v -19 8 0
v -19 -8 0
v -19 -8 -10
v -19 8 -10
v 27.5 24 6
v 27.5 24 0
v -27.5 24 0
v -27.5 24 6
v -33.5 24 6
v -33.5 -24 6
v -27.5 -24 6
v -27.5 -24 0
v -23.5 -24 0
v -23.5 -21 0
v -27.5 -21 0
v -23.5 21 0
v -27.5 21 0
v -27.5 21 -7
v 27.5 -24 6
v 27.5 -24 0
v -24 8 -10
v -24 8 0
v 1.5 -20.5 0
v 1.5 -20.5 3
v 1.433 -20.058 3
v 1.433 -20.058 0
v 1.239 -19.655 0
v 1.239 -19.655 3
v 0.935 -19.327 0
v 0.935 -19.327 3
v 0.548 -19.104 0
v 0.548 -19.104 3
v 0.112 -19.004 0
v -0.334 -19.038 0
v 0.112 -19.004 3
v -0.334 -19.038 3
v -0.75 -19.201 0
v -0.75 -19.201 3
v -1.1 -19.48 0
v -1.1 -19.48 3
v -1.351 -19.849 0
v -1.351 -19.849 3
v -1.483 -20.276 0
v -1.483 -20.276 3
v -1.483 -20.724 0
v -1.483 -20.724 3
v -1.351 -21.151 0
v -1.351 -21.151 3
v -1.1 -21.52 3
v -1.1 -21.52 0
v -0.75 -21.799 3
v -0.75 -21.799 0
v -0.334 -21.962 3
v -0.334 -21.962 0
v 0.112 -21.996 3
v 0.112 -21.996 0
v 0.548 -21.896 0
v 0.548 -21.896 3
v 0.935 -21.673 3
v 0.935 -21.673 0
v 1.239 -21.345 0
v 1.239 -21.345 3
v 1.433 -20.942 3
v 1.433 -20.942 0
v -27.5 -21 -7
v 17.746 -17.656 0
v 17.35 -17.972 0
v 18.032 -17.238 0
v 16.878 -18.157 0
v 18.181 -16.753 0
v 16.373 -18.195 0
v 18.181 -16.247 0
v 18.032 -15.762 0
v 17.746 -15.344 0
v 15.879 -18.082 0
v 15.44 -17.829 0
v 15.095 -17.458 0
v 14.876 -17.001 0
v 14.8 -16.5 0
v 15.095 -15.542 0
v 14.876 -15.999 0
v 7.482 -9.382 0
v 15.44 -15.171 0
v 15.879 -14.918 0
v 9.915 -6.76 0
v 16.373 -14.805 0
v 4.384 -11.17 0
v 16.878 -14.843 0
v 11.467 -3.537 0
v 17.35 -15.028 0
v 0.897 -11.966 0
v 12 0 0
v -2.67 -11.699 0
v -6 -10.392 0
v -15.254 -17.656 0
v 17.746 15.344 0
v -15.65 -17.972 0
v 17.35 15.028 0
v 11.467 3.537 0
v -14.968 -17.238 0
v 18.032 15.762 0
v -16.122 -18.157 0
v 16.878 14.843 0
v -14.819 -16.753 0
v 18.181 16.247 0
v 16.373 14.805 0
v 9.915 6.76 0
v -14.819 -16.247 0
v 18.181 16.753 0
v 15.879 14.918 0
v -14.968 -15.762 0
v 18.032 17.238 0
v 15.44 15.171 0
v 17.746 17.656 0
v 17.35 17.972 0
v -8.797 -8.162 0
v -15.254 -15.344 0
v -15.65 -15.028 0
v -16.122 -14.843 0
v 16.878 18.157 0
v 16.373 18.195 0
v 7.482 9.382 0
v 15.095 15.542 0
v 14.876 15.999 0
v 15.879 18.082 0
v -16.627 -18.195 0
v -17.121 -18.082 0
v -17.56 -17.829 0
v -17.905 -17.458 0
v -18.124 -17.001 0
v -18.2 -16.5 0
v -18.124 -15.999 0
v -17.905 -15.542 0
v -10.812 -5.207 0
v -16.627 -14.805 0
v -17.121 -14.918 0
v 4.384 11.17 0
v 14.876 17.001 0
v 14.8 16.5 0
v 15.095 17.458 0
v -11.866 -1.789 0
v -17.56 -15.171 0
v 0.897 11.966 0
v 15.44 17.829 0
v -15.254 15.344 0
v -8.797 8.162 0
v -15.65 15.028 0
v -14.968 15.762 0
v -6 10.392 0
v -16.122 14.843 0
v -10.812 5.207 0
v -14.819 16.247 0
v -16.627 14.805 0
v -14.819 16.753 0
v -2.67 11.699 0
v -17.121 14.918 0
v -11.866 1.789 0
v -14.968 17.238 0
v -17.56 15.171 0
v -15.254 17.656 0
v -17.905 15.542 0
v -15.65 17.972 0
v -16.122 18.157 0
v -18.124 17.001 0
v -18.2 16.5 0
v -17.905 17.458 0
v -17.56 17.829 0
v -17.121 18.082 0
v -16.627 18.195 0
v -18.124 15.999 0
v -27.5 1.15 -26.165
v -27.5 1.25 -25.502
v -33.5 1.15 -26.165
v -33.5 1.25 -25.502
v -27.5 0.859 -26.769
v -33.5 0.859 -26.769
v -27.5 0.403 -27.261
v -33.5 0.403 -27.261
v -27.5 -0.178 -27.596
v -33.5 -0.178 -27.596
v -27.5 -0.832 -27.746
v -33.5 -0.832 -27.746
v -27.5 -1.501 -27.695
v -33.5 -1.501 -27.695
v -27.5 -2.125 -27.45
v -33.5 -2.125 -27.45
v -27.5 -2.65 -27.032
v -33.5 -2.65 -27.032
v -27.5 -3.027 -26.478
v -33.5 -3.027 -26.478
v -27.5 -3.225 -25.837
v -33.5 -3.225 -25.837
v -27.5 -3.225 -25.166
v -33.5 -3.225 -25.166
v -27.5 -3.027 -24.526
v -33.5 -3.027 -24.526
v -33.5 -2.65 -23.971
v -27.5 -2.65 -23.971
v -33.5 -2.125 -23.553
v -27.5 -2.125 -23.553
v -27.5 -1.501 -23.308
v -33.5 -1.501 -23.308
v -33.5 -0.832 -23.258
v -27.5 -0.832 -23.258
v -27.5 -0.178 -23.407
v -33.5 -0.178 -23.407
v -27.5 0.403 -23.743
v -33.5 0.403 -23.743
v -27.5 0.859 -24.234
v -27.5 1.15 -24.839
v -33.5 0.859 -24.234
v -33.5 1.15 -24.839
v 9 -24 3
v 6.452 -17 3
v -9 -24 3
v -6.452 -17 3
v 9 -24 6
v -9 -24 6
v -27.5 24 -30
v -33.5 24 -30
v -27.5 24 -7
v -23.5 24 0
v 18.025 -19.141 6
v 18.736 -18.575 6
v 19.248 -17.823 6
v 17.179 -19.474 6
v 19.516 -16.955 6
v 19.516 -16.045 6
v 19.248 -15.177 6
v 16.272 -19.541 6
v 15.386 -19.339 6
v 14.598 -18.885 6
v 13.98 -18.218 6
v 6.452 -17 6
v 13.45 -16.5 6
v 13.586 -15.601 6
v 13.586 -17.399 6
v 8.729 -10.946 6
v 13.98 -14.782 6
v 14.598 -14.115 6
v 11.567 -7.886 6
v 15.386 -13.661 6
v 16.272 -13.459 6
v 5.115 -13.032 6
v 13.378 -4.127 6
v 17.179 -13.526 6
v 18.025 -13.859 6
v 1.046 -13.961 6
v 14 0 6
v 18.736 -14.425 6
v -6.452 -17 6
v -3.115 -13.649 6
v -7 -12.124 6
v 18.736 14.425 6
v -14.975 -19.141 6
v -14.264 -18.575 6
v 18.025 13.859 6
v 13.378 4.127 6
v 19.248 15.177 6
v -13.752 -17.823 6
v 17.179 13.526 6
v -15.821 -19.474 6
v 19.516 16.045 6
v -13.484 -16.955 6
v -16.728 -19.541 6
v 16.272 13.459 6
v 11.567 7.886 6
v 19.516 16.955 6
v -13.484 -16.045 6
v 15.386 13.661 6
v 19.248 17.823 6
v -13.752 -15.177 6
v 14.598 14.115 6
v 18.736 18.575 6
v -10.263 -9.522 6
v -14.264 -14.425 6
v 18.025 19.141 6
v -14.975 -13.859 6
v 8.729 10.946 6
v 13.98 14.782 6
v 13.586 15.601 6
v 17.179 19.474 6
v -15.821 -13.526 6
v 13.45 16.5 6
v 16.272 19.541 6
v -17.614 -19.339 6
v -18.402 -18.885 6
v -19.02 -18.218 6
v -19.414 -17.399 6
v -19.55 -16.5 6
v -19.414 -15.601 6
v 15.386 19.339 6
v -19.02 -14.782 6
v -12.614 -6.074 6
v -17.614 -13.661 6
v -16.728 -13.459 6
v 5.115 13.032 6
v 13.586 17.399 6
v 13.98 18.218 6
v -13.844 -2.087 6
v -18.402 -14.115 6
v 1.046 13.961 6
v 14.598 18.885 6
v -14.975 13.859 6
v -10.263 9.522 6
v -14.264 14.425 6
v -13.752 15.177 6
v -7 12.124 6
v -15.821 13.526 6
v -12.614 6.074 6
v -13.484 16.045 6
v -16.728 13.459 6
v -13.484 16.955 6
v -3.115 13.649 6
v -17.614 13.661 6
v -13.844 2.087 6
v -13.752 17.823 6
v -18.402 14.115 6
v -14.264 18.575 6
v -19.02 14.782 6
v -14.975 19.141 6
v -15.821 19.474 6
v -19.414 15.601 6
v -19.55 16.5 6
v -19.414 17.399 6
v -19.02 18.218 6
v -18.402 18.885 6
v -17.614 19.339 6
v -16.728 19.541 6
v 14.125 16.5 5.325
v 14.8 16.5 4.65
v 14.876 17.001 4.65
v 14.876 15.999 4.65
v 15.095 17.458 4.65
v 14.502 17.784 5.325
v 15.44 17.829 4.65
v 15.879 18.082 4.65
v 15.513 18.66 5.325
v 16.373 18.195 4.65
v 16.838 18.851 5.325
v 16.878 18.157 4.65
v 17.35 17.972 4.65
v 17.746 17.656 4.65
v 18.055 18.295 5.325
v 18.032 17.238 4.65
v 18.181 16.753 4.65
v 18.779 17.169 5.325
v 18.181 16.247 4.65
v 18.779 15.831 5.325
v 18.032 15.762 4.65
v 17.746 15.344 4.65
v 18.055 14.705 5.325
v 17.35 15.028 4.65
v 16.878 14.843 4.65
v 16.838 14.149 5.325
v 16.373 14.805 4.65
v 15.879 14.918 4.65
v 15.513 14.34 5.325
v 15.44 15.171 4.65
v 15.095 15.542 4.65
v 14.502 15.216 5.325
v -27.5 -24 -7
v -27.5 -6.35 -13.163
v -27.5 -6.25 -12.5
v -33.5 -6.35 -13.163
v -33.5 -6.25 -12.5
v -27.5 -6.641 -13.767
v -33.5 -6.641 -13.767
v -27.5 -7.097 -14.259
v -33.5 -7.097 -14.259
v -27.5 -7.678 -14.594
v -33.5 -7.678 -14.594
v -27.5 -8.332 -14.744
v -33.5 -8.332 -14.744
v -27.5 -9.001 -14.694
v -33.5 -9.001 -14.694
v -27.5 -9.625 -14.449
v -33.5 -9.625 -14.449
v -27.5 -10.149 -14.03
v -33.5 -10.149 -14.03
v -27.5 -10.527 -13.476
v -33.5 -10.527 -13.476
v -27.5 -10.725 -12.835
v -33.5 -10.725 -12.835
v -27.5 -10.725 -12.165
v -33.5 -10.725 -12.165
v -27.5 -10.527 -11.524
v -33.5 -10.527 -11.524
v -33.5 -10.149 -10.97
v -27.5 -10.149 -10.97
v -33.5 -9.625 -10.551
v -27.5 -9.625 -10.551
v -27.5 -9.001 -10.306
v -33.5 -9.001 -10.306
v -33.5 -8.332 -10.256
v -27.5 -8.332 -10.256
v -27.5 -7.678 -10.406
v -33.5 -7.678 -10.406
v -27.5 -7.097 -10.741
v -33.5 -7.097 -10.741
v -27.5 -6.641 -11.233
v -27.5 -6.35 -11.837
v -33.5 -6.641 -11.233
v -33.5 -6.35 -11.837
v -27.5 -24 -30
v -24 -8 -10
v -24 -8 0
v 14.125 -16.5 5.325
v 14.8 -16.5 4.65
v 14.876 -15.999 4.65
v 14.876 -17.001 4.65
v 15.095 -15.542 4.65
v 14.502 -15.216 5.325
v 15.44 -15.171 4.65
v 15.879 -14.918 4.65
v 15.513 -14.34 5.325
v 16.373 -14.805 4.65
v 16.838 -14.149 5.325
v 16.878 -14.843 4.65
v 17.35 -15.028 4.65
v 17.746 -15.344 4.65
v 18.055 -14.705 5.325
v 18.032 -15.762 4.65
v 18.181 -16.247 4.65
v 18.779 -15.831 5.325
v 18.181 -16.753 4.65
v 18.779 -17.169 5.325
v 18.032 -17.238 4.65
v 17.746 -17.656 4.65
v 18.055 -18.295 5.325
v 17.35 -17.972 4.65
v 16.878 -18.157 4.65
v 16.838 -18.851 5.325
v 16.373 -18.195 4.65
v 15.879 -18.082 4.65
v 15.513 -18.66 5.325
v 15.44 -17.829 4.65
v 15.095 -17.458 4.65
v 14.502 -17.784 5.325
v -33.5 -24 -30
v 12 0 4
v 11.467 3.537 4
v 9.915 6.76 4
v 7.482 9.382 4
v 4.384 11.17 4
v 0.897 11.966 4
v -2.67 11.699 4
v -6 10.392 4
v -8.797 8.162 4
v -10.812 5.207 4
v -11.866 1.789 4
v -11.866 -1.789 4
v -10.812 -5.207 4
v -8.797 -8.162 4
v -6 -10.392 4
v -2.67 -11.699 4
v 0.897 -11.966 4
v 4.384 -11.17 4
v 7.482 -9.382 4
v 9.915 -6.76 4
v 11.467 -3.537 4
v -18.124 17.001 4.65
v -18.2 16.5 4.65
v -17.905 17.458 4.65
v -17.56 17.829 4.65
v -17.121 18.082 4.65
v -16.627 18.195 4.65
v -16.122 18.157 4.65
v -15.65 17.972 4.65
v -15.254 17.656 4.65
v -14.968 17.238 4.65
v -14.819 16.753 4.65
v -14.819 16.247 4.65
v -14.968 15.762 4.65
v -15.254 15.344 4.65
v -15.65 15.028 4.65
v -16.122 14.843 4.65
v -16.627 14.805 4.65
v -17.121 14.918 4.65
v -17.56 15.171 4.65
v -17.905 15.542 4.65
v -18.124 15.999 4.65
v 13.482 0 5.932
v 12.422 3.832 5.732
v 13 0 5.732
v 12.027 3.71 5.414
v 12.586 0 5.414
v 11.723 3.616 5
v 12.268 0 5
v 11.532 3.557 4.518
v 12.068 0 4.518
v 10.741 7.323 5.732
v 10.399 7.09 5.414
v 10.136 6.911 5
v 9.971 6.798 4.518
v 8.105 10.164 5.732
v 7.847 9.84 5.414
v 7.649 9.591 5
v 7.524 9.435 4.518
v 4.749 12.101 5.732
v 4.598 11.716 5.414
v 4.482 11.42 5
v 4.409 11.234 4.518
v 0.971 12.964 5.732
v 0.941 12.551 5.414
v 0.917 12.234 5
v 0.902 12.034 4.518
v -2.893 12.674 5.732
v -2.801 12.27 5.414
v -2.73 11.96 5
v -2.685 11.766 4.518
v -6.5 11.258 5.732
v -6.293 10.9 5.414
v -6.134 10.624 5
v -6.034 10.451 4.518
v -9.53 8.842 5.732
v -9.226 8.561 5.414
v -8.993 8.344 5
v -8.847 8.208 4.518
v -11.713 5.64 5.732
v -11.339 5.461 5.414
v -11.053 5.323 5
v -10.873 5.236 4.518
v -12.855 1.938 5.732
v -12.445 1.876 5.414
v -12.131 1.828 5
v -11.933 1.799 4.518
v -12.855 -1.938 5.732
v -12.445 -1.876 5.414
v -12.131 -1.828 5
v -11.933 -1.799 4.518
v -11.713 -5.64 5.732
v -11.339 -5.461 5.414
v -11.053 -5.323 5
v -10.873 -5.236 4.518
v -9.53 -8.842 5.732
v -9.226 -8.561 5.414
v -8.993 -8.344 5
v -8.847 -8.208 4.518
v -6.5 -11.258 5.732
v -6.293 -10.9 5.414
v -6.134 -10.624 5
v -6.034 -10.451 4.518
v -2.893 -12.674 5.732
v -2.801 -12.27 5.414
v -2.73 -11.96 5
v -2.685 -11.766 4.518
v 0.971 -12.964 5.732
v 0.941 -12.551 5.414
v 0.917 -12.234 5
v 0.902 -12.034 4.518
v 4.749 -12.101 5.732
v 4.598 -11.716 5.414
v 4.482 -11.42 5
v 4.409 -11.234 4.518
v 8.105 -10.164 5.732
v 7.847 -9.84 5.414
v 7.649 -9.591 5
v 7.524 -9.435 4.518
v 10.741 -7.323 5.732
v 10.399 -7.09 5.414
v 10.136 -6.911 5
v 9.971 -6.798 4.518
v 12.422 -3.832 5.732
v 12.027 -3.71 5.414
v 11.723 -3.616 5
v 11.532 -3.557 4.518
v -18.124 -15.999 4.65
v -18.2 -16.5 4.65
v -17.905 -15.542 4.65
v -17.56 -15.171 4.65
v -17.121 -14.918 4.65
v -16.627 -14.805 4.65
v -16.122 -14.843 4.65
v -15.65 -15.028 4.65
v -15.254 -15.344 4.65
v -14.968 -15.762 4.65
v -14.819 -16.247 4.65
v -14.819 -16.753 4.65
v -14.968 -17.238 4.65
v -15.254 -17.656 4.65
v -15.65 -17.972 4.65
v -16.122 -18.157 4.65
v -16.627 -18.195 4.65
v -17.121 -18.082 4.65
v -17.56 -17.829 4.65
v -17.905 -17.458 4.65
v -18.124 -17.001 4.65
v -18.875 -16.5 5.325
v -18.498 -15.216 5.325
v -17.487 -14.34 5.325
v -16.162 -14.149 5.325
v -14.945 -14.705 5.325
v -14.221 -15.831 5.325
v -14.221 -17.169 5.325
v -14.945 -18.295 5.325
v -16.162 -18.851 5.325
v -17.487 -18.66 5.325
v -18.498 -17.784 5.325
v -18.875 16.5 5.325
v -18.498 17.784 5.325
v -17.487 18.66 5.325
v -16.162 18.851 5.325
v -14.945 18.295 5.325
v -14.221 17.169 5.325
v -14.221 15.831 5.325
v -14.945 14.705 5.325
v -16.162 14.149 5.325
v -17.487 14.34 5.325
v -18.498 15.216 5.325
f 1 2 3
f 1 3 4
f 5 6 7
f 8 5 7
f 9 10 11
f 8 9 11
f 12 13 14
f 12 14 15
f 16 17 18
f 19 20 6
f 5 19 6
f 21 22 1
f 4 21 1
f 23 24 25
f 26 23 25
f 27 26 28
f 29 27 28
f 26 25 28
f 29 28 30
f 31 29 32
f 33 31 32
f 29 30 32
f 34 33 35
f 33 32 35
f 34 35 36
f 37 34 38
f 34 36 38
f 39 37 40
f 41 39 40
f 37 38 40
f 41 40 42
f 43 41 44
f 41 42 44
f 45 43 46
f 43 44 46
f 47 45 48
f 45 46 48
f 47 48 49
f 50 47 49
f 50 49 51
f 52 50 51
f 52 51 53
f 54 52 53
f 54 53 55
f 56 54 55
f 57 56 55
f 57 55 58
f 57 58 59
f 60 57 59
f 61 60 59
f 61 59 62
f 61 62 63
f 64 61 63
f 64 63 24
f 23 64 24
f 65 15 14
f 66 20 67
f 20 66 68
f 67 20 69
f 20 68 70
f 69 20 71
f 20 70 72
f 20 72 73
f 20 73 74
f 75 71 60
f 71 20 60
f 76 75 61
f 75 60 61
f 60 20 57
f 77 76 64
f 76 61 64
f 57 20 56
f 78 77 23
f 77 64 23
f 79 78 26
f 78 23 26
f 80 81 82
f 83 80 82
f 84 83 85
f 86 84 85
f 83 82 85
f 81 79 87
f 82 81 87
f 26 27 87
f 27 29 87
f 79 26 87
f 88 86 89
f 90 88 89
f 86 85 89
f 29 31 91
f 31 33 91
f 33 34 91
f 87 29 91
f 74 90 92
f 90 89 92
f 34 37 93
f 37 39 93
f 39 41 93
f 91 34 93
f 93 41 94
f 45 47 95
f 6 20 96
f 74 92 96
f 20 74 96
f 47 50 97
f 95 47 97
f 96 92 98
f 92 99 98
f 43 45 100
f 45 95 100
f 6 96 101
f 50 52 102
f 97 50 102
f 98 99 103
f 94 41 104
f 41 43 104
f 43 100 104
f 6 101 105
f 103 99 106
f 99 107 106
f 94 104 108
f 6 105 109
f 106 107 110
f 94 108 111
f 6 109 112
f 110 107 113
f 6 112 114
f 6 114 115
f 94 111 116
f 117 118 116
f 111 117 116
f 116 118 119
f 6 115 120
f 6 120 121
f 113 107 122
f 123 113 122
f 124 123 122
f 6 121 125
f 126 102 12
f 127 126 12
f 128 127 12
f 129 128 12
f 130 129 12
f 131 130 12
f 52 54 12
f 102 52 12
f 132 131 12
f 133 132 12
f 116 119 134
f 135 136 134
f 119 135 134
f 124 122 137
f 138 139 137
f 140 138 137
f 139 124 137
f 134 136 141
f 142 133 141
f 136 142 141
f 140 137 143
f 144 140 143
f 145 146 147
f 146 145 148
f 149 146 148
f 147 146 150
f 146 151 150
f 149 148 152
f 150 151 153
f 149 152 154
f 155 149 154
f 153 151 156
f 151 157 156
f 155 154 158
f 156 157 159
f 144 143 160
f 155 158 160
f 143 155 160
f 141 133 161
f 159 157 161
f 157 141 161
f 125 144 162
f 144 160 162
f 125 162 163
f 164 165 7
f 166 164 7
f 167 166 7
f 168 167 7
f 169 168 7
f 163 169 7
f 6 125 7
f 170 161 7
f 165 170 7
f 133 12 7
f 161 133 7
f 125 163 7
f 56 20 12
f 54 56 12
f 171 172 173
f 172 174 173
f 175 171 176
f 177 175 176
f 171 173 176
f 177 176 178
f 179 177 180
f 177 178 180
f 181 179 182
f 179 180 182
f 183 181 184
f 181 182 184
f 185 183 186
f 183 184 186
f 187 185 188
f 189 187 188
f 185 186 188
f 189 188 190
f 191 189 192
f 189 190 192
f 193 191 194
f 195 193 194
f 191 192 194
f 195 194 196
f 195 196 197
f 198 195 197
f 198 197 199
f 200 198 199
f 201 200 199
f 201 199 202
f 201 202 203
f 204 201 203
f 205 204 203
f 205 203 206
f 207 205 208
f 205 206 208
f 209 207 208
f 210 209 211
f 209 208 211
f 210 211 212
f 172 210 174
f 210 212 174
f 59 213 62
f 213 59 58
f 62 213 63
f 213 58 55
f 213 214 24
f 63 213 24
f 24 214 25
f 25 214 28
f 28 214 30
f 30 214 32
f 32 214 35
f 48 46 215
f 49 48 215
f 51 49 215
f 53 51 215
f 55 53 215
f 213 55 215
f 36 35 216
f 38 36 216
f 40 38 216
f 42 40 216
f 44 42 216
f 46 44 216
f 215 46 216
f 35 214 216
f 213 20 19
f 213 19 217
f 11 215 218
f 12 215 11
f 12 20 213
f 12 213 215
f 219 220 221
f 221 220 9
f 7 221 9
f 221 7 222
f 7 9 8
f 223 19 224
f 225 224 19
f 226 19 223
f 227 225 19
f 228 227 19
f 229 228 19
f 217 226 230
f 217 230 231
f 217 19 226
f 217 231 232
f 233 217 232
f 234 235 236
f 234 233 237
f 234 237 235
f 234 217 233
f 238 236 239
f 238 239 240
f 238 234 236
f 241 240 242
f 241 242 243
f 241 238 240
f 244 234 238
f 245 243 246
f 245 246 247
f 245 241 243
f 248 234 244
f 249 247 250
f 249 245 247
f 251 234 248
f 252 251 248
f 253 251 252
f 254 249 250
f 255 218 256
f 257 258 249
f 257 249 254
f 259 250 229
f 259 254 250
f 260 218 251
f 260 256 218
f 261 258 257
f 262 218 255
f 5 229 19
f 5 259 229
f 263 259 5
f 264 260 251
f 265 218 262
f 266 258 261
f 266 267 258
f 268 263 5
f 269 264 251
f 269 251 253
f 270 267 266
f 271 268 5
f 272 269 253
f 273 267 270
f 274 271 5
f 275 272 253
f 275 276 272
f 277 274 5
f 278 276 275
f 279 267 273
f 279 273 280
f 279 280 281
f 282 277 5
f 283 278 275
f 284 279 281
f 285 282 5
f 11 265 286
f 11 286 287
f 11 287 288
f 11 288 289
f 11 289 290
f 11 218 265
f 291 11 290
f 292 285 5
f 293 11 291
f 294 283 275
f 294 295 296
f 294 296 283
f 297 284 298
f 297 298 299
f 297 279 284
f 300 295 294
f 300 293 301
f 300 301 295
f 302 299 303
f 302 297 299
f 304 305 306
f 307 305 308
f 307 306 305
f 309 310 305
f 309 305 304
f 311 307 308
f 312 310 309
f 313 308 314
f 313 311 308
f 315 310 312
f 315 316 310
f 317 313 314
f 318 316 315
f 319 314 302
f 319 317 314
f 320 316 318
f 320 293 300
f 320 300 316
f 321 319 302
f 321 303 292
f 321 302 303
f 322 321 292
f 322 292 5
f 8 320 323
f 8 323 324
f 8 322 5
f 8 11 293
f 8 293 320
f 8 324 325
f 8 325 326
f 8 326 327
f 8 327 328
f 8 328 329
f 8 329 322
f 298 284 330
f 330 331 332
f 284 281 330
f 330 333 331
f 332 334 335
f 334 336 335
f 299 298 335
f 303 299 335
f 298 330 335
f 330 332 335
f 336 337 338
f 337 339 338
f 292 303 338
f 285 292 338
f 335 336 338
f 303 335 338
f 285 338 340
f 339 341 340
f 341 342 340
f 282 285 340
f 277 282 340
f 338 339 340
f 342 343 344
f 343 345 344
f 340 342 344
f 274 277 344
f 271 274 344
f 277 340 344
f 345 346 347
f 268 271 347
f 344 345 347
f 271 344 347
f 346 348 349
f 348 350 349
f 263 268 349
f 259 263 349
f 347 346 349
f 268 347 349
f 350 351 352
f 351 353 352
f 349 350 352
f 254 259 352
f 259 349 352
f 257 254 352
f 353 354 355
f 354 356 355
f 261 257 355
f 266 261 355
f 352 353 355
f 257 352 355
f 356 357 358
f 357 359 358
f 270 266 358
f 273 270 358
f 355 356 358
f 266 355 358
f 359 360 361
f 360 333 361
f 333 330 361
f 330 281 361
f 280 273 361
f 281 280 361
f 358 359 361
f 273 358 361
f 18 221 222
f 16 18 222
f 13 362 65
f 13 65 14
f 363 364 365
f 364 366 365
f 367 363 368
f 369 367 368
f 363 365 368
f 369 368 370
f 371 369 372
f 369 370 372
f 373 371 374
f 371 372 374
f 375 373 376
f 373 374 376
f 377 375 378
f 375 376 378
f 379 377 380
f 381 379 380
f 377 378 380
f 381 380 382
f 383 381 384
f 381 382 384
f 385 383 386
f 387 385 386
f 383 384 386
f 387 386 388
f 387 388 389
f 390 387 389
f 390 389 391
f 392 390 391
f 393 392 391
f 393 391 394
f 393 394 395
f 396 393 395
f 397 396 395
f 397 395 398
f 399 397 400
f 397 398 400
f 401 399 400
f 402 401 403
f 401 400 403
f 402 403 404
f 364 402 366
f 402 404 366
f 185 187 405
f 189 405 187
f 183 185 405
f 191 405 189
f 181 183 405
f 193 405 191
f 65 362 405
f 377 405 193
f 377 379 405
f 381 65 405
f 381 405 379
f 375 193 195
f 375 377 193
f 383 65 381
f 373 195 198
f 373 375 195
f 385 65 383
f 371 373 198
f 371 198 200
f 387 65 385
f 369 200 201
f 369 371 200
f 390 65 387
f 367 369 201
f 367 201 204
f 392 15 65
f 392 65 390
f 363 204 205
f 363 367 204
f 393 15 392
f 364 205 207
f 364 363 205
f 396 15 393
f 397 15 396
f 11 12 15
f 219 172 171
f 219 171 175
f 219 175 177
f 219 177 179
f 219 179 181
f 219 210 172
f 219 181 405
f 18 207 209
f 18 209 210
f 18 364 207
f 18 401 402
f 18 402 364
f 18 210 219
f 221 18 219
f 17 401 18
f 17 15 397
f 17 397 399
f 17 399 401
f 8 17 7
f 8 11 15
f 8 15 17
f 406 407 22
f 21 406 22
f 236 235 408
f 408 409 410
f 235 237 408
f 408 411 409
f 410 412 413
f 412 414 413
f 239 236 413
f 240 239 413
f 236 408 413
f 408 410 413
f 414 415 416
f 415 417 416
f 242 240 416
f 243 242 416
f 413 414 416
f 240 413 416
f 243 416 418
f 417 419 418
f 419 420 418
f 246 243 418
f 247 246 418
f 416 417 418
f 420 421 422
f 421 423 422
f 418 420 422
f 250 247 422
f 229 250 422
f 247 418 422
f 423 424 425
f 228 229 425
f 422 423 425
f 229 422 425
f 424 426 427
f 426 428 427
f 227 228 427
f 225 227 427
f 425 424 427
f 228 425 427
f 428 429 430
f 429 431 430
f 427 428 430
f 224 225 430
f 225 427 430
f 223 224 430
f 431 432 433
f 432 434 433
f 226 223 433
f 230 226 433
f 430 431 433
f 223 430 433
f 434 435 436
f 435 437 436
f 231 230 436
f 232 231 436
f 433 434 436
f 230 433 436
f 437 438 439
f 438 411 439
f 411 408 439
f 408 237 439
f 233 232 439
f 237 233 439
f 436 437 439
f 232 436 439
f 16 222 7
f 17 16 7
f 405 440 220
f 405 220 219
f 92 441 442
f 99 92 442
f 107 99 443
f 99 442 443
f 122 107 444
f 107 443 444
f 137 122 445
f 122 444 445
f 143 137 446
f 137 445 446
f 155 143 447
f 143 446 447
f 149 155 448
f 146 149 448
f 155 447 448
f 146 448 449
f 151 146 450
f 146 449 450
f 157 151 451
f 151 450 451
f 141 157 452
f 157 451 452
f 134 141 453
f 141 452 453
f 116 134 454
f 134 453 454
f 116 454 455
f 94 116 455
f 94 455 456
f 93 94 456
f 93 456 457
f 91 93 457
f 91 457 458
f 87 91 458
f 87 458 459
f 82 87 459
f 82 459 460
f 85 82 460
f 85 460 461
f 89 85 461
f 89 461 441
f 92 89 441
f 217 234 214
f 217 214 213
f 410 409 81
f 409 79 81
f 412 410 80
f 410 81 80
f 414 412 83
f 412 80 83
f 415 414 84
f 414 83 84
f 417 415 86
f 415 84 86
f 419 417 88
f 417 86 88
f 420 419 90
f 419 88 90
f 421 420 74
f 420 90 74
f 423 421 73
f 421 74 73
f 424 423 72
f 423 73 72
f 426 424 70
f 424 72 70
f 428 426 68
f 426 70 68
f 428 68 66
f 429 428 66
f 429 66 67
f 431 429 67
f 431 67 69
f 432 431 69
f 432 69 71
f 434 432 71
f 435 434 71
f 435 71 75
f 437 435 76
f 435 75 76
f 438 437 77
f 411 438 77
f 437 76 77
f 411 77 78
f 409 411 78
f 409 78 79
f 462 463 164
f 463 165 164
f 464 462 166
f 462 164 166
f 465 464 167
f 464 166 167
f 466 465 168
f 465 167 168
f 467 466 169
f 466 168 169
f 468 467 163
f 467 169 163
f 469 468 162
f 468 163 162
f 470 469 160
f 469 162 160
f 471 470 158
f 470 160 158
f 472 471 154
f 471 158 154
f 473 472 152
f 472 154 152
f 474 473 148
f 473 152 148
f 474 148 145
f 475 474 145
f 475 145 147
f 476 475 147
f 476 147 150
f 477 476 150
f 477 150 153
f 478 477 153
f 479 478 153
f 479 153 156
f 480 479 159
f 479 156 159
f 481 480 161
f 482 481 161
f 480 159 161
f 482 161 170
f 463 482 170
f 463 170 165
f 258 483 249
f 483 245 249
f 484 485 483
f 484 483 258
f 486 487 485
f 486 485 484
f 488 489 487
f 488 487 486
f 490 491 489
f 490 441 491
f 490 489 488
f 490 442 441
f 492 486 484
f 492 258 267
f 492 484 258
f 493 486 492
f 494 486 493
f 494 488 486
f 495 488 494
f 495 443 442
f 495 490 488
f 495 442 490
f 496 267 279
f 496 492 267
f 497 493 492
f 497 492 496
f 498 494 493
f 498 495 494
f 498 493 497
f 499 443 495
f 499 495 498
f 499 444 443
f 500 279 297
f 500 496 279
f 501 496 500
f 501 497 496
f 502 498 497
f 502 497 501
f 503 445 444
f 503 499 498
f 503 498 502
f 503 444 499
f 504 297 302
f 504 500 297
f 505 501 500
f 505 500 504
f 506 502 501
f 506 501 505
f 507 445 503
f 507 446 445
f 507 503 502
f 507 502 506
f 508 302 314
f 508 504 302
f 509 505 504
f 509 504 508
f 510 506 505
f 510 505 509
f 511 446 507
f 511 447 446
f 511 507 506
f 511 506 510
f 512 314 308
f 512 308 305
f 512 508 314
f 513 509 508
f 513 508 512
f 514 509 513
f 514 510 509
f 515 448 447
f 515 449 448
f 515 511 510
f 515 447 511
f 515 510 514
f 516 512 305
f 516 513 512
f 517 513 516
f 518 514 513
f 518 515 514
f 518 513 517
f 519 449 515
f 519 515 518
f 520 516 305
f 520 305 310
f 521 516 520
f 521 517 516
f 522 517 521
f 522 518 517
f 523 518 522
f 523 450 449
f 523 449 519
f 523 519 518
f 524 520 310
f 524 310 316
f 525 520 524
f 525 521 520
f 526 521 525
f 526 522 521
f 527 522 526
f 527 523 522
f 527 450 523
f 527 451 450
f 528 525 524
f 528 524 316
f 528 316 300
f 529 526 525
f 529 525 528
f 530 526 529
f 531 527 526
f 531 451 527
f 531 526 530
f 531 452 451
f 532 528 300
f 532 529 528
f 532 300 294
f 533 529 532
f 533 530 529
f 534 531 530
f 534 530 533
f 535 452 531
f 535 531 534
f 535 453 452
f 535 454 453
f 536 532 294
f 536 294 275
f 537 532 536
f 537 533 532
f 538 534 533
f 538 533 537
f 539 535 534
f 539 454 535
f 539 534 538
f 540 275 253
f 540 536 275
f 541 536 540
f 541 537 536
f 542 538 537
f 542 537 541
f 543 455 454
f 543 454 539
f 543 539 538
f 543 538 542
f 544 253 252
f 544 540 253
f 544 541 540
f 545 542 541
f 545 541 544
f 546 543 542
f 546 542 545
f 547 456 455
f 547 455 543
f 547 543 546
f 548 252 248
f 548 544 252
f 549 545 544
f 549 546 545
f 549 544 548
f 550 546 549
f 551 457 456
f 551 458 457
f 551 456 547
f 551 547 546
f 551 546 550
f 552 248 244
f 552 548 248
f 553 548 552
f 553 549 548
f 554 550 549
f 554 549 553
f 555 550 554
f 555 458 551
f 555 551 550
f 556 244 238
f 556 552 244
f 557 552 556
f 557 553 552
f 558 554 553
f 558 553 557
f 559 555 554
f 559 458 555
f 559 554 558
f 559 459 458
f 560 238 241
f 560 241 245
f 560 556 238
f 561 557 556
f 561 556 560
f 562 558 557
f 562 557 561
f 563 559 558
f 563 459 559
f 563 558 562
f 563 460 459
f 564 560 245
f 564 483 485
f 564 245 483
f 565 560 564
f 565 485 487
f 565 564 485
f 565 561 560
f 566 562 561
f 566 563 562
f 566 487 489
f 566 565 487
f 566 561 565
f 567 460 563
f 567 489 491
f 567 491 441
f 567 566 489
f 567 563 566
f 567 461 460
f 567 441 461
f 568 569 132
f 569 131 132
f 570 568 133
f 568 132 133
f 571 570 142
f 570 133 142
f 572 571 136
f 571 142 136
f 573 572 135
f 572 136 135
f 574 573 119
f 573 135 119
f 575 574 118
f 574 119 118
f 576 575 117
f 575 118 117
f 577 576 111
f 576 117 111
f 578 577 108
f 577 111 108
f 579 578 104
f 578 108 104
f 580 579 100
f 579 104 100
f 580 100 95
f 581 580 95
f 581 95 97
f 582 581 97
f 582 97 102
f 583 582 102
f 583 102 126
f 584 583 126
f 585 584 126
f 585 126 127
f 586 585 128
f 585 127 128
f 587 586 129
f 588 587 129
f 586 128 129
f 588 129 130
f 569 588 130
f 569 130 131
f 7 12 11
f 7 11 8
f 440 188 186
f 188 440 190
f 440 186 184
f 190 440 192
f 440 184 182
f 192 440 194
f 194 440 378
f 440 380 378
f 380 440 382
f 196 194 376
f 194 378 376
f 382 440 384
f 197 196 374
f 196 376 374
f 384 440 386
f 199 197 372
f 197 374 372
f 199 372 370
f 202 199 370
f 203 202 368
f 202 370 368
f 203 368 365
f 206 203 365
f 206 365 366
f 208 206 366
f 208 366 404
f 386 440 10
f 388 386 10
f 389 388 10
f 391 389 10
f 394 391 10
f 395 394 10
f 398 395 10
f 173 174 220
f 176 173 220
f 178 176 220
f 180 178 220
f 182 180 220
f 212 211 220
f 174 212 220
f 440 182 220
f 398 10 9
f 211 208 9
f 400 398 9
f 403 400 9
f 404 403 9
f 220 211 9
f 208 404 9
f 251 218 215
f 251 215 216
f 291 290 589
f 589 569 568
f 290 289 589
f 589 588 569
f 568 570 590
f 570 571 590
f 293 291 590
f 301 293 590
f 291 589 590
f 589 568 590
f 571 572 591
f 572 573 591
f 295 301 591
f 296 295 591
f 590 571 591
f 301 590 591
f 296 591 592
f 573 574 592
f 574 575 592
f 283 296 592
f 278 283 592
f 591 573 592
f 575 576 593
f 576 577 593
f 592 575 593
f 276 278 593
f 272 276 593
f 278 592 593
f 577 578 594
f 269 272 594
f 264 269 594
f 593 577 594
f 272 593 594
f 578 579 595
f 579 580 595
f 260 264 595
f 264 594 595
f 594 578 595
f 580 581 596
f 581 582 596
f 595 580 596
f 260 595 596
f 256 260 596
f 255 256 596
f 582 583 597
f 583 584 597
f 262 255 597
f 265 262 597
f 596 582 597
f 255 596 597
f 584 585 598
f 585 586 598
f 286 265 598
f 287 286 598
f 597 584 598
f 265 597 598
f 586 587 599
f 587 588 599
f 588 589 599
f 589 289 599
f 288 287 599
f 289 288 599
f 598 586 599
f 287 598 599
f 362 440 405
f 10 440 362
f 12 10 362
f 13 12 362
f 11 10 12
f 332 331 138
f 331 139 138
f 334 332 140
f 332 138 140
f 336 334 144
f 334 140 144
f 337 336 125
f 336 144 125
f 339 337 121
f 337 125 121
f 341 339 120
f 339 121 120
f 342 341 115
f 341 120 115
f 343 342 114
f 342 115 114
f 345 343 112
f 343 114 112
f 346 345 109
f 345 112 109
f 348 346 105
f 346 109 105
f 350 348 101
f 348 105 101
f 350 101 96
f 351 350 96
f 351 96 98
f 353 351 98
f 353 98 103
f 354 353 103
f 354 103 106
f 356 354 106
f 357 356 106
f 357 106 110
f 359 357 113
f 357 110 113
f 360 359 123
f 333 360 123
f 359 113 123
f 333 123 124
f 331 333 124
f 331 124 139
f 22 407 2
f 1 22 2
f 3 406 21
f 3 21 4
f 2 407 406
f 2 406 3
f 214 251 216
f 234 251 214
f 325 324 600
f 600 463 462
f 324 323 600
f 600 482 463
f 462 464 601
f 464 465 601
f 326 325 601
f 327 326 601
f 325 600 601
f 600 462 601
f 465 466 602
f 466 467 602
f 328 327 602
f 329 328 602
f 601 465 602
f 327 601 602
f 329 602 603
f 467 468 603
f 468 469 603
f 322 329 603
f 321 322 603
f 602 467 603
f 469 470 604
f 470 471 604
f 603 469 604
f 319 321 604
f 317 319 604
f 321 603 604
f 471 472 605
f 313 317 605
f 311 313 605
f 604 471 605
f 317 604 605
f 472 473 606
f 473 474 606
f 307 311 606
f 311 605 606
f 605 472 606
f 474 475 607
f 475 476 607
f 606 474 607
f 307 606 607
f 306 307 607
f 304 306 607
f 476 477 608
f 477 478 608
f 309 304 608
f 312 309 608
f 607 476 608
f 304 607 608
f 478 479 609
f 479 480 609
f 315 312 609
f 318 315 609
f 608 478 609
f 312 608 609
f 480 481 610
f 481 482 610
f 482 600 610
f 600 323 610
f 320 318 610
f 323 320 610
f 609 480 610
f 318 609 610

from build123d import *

# Parameters (mm, degrees)
BINDER_W            = 48
BINDER_H            = 55
PAD_DEPTH           = 6
HOLE_D              = 3.4
HOLE_CSINK_D        = 6.1
HOLE_CSINK_ANGLE    = 90
SKETCH005_R         = 12
POCKET_DEPTH        = 6.001
FILLET_R            = 2
POCKET001_DEPTH     = 3
SKETCH007_R         = 1.5
POCKET002_DEPTH     = 3.001
SKETCH002_W         = 6
SKETCH002_H         = 48
PAD001_DEPTH        = 6
PAD001_DEPTH_BACK   = 30
PAD002_DEPTH        = 3
HOLE004_D           = 4.5
HOLE004_DEPTH       = 25
HOLE004_CSINK_D     = 6.1
HOLE004_CSINK_ANGLE = 90
SKETCH019_W         = 5
SKETCH019_H         = 16
PAD003_DEPTH        = 10


with BuildPart() as body001:
    # Binder → Pad (new body)
    with BuildSketch(Plane(origin=(0, 0, 0), x_dir=(0, 1, 0), z_dir=(0, 0, 1))):
        Rectangle(BINDER_W, BINDER_H)
    extrude(amount=PAD_DEPTH)

    # Hole (through all)
    with Locations(Plane.XY.offset(6)):
        with Locations((-16.5, 16.5), (-16.5, -16.5), (16.5, -16.5), (16.5, 16.5)):
            CounterSinkHole(HOLE_D / 2, HOLE_CSINK_D / 2, counter_sink_angle=HOLE_CSINK_ANGLE)

    # Sketch005 (on Face5 of Hole) → Pocket (cut, through all)
    with BuildSketch(Plane.XY.offset(6)):
        Circle(SKETCH005_R)
    extrude(amount=-POCKET_DEPTH, mode=Mode.SUBTRACT)

    # Fillet
    fillet_edges = [body001.edges().sort_by_distance(p)[0] for p in [
        (-12, 0, 6),
    ]]
    fillet(fillet_edges, radius=FILLET_R)

    # Sketch006 (on Face1 of Fillet) → Pocket001 (cut)
    with BuildSketch(Plane.XY.offset(6)):
        Polygon((-9, -24), (-6.452208, -17), (6.452208, -17), (9, -24), align=None)
    extrude(amount=-POCKET001_DEPTH, mode=Mode.SUBTRACT)

    # Sketch007 (on Face15 of Pocket001) → Pocket002 (cut, through all)
    with BuildSketch(Plane.XY.offset(3)):
        with Locations((0, -20.5)):
            Circle(SKETCH007_R)
    extrude(amount=-POCKET002_DEPTH, mode=Mode.SUBTRACT)


with BuildPart() as body002:
    # Sketch002 (on Face1 of Binder001) → Pad001 (new body, two sides)
    with BuildSketch(Plane.XY) as pad001_sk:
        with Locations((-30.5, 0)):
            Rectangle(SKETCH002_W, SKETCH002_H)
    extrude(amount=PAD001_DEPTH)
    extrude(pad001_sk.sketch, amount=-PAD001_DEPTH_BACK)

    # Sketch003 (on Face3 of Pad001) → Pad002 (join)
    with BuildSketch(Plane.XZ.offset(24)):
        Polygon((-27.5, 0), (-27.5, -7), (-23.5, 0), align=None)
    pad002 = extrude(amount=-PAD002_DEPTH)

    # Mirrored: Pad002 across XZ
    add(pad002.mirror(Plane.XZ))

    # Hole004
    with Locations(Plane(origin=(-21, -191, 0), x_dir=(0, -1, 0), z_dir=(1, 0, 0))):
        with Locations((-189.999737, 25.501831), (-182.5, 12.5)):
            CounterSinkHole(HOLE004_D / 2, HOLE004_CSINK_D / 2, depth=HOLE004_DEPTH, counter_sink_angle=HOLE004_CSINK_ANGLE)


with BuildPart() as body005:
    # Sketch019 (on Face1 of Binder012) → Pad003 (new body)
    with BuildSketch(Plane.XY):
        with Locations((-21.5, 0)):
            Rectangle(SKETCH019_W, SKETCH019_H)
    extrude(amount=-PAD003_DEPTH)


solid = Compound([body001.part, body002.part, body005.part])
